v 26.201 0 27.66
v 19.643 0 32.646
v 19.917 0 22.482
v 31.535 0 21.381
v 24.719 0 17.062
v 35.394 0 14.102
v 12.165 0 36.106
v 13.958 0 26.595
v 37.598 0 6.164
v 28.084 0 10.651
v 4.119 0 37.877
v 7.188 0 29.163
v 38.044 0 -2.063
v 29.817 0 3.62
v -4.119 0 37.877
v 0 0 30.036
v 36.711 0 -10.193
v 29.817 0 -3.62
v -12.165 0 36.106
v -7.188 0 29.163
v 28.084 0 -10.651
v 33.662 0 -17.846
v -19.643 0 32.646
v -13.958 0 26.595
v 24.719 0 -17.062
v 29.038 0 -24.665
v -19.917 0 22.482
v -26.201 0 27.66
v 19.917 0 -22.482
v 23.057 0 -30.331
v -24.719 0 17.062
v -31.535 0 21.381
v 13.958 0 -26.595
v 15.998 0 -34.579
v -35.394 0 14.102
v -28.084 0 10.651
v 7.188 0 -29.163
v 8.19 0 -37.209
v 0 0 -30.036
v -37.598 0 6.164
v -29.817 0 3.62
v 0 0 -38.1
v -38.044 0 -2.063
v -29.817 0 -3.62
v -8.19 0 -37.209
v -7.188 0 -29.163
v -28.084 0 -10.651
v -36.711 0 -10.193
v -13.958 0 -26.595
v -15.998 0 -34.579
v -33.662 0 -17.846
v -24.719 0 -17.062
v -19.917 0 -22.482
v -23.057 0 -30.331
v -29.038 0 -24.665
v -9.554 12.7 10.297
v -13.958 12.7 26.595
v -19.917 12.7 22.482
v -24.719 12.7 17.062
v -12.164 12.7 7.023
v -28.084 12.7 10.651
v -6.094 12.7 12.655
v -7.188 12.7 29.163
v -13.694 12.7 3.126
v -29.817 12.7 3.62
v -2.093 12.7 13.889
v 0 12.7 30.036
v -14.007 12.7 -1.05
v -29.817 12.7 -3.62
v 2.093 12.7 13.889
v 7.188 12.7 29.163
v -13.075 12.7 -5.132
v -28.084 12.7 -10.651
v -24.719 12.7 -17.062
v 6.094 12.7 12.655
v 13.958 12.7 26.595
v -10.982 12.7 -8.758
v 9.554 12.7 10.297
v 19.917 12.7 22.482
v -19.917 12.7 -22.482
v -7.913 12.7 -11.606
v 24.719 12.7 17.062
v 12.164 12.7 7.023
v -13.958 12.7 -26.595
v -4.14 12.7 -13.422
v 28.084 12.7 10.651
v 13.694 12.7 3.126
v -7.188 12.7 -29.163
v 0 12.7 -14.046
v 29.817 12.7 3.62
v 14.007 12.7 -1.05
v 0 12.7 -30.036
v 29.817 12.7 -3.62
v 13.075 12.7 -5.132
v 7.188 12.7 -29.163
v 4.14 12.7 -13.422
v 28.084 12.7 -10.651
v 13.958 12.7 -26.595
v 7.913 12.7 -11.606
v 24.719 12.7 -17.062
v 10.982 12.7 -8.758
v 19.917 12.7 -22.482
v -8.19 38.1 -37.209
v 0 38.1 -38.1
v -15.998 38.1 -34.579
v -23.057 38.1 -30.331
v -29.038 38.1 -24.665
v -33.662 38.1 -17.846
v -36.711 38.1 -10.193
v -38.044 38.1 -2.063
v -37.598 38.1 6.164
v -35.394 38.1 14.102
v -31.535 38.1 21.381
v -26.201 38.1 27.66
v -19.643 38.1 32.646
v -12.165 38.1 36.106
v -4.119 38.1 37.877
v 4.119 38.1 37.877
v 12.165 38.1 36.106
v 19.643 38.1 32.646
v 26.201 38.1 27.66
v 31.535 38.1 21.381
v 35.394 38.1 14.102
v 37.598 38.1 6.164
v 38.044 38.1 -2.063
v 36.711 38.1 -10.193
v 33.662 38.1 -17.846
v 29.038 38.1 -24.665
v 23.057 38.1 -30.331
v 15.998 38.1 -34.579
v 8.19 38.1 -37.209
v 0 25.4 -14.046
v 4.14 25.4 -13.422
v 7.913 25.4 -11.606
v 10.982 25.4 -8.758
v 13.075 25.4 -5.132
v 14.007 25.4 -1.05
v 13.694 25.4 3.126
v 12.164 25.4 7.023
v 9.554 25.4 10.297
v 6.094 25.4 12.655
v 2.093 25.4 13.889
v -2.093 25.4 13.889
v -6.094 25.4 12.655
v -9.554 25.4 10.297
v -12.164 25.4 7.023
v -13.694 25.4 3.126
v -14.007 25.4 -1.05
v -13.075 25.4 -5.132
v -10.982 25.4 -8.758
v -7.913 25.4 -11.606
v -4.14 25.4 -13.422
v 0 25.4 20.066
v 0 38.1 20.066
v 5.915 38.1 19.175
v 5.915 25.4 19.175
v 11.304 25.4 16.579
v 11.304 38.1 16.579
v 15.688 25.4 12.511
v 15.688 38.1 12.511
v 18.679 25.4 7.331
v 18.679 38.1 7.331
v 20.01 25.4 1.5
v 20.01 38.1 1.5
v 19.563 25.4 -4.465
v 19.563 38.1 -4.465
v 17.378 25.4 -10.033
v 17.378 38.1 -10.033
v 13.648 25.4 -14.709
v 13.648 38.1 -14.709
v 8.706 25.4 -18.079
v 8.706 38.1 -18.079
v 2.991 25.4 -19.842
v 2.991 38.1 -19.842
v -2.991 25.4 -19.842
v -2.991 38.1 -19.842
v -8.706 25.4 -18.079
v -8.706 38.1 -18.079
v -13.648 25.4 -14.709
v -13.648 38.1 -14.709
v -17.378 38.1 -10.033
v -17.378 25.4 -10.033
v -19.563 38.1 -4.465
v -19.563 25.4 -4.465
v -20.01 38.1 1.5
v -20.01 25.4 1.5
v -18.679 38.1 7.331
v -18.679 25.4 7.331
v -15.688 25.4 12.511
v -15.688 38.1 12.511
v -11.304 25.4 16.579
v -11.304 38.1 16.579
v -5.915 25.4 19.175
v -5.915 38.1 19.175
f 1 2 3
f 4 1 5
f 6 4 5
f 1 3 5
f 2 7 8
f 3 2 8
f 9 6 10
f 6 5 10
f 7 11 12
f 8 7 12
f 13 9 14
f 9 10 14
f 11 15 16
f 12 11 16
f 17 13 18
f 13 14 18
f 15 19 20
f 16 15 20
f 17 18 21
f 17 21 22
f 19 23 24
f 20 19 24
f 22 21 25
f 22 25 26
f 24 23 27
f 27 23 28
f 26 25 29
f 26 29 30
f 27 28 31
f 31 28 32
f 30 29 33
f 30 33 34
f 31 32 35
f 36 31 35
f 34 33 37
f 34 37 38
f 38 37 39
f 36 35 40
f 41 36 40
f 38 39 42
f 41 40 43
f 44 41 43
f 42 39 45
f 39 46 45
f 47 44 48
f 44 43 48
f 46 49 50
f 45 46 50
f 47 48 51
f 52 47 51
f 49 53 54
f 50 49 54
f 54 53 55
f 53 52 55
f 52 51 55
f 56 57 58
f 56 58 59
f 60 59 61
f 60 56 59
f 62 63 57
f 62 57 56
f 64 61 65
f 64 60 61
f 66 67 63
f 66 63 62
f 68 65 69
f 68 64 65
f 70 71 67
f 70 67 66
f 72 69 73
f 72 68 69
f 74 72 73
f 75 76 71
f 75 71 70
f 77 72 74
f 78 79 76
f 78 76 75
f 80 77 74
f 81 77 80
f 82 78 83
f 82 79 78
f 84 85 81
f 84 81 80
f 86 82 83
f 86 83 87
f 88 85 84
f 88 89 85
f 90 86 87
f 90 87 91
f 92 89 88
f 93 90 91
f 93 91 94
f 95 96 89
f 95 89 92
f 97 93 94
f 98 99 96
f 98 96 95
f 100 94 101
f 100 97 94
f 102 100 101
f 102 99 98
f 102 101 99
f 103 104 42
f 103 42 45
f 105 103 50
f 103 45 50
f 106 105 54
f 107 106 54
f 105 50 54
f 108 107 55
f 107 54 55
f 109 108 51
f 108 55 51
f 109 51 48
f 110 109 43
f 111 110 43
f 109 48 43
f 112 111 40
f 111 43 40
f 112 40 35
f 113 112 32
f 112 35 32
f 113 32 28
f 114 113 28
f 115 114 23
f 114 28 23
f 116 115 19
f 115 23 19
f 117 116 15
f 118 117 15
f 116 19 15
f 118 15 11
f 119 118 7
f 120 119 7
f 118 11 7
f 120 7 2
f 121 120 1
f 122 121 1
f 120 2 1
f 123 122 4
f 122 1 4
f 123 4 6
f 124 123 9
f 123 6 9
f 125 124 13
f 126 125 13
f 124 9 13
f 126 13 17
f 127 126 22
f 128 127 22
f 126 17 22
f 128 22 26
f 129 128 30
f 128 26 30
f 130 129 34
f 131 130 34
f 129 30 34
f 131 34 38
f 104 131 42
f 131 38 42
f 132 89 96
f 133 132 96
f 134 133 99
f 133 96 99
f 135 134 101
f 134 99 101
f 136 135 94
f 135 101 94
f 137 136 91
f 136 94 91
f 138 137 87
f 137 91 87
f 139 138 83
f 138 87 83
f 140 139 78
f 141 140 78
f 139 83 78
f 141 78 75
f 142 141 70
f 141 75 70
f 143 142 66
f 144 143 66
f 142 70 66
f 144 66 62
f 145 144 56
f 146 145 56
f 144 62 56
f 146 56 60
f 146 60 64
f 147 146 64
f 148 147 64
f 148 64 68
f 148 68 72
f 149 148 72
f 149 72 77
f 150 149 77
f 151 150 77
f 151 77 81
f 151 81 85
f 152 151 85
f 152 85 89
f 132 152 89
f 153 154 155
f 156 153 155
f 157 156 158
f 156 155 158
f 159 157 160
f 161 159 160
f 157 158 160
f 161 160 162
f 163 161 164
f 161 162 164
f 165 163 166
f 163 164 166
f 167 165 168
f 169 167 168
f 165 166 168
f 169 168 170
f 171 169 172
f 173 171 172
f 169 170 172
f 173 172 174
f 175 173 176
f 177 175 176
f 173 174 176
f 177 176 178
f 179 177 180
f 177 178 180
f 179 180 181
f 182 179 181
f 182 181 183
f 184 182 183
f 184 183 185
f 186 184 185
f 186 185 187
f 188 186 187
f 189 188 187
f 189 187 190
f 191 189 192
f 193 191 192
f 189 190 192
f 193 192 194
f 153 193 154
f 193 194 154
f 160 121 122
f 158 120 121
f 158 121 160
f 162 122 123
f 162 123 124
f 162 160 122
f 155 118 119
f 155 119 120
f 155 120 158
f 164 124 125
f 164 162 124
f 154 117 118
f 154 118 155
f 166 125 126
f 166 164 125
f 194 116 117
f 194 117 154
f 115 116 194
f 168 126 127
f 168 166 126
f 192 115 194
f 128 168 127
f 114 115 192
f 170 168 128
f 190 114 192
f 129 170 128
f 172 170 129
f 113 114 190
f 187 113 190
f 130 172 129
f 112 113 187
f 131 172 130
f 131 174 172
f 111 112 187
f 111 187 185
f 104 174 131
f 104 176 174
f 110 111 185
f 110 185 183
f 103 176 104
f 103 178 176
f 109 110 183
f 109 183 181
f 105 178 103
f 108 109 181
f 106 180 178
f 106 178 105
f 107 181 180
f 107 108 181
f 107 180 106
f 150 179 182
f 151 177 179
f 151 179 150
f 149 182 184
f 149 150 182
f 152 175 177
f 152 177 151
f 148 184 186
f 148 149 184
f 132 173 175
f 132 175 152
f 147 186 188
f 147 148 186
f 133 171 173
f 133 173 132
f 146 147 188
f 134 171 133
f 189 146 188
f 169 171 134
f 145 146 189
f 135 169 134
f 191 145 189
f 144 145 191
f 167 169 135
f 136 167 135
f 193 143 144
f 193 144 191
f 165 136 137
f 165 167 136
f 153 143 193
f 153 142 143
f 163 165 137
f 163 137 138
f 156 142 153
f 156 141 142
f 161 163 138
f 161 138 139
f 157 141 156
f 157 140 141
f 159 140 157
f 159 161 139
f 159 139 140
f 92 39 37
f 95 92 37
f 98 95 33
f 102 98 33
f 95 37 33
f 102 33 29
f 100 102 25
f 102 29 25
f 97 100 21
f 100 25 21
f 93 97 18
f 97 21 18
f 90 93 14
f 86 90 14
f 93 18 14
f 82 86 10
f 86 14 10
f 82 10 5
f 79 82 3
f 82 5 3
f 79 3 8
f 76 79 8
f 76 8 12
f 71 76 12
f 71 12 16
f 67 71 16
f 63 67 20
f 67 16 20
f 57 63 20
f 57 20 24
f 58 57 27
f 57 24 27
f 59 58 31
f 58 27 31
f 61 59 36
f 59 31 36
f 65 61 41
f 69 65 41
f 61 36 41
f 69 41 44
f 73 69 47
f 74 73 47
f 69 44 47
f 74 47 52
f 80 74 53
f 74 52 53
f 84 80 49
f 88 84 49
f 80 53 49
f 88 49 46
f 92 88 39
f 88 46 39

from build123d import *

# Parameters (mm, degrees)
SKETCH1_R           = 38.1
BOSS_EXTRUDE1_DEPTH = 38.1
SKETCH2_R           = 14.0462
CUT_EXTRUDE1_DEPTH  = 76.2
SKETCH3_R           = 20.066
CUT_EXTRUDE2_DEPTH  = 12.7
SKETCH4_R           = 30.0355
CUT_EXTRUDE3_DEPTH  = 12.7


with BuildPart() as part:
    # Sketch1 → Boss-Extrude1 (new body)
    with BuildSketch(Plane(origin=(0, 0, 0), x_dir=(1, 0, 0), z_dir=(0, 1, 0))):
        with Locations(Location((0, 0, 0), (0, 0, 90))):
            Circle(SKETCH1_R)
    extrude(amount=BOSS_EXTRUDE1_DEPTH)

    # Sketch2 → Cut-Extrude1 (cut)
    with BuildSketch(Plane.XZ):
        with Locations(Location((0, 0, 0), (0, 0, 270))):
            Circle(SKETCH2_R)
    extrude(amount=-CUT_EXTRUDE1_DEPTH, mode=Mode.SUBTRACT)

    # Sketch3 → Cut-Extrude2 (cut)
    with BuildSketch(Plane(origin=(0, 38.1, 0), x_dir=(1, 0, 0), z_dir=(0, 1, 0))):
        with Locations(Location((0, 0, 0), (0, 0, 270))):
            Circle(SKETCH3_R)
    extrude(amount=-CUT_EXTRUDE2_DEPTH, mode=Mode.SUBTRACT)

    # Sketch4 → Cut-Extrude3 (cut)
    with BuildSketch(Plane.XZ):
        with Locations(Location((0, 0, 0), (0, 0, 270))):
            Circle(SKETCH4_R)
    extrude(amount=-CUT_EXTRUDE3_DEPTH, mode=Mode.SUBTRACT)


solid = part.part
